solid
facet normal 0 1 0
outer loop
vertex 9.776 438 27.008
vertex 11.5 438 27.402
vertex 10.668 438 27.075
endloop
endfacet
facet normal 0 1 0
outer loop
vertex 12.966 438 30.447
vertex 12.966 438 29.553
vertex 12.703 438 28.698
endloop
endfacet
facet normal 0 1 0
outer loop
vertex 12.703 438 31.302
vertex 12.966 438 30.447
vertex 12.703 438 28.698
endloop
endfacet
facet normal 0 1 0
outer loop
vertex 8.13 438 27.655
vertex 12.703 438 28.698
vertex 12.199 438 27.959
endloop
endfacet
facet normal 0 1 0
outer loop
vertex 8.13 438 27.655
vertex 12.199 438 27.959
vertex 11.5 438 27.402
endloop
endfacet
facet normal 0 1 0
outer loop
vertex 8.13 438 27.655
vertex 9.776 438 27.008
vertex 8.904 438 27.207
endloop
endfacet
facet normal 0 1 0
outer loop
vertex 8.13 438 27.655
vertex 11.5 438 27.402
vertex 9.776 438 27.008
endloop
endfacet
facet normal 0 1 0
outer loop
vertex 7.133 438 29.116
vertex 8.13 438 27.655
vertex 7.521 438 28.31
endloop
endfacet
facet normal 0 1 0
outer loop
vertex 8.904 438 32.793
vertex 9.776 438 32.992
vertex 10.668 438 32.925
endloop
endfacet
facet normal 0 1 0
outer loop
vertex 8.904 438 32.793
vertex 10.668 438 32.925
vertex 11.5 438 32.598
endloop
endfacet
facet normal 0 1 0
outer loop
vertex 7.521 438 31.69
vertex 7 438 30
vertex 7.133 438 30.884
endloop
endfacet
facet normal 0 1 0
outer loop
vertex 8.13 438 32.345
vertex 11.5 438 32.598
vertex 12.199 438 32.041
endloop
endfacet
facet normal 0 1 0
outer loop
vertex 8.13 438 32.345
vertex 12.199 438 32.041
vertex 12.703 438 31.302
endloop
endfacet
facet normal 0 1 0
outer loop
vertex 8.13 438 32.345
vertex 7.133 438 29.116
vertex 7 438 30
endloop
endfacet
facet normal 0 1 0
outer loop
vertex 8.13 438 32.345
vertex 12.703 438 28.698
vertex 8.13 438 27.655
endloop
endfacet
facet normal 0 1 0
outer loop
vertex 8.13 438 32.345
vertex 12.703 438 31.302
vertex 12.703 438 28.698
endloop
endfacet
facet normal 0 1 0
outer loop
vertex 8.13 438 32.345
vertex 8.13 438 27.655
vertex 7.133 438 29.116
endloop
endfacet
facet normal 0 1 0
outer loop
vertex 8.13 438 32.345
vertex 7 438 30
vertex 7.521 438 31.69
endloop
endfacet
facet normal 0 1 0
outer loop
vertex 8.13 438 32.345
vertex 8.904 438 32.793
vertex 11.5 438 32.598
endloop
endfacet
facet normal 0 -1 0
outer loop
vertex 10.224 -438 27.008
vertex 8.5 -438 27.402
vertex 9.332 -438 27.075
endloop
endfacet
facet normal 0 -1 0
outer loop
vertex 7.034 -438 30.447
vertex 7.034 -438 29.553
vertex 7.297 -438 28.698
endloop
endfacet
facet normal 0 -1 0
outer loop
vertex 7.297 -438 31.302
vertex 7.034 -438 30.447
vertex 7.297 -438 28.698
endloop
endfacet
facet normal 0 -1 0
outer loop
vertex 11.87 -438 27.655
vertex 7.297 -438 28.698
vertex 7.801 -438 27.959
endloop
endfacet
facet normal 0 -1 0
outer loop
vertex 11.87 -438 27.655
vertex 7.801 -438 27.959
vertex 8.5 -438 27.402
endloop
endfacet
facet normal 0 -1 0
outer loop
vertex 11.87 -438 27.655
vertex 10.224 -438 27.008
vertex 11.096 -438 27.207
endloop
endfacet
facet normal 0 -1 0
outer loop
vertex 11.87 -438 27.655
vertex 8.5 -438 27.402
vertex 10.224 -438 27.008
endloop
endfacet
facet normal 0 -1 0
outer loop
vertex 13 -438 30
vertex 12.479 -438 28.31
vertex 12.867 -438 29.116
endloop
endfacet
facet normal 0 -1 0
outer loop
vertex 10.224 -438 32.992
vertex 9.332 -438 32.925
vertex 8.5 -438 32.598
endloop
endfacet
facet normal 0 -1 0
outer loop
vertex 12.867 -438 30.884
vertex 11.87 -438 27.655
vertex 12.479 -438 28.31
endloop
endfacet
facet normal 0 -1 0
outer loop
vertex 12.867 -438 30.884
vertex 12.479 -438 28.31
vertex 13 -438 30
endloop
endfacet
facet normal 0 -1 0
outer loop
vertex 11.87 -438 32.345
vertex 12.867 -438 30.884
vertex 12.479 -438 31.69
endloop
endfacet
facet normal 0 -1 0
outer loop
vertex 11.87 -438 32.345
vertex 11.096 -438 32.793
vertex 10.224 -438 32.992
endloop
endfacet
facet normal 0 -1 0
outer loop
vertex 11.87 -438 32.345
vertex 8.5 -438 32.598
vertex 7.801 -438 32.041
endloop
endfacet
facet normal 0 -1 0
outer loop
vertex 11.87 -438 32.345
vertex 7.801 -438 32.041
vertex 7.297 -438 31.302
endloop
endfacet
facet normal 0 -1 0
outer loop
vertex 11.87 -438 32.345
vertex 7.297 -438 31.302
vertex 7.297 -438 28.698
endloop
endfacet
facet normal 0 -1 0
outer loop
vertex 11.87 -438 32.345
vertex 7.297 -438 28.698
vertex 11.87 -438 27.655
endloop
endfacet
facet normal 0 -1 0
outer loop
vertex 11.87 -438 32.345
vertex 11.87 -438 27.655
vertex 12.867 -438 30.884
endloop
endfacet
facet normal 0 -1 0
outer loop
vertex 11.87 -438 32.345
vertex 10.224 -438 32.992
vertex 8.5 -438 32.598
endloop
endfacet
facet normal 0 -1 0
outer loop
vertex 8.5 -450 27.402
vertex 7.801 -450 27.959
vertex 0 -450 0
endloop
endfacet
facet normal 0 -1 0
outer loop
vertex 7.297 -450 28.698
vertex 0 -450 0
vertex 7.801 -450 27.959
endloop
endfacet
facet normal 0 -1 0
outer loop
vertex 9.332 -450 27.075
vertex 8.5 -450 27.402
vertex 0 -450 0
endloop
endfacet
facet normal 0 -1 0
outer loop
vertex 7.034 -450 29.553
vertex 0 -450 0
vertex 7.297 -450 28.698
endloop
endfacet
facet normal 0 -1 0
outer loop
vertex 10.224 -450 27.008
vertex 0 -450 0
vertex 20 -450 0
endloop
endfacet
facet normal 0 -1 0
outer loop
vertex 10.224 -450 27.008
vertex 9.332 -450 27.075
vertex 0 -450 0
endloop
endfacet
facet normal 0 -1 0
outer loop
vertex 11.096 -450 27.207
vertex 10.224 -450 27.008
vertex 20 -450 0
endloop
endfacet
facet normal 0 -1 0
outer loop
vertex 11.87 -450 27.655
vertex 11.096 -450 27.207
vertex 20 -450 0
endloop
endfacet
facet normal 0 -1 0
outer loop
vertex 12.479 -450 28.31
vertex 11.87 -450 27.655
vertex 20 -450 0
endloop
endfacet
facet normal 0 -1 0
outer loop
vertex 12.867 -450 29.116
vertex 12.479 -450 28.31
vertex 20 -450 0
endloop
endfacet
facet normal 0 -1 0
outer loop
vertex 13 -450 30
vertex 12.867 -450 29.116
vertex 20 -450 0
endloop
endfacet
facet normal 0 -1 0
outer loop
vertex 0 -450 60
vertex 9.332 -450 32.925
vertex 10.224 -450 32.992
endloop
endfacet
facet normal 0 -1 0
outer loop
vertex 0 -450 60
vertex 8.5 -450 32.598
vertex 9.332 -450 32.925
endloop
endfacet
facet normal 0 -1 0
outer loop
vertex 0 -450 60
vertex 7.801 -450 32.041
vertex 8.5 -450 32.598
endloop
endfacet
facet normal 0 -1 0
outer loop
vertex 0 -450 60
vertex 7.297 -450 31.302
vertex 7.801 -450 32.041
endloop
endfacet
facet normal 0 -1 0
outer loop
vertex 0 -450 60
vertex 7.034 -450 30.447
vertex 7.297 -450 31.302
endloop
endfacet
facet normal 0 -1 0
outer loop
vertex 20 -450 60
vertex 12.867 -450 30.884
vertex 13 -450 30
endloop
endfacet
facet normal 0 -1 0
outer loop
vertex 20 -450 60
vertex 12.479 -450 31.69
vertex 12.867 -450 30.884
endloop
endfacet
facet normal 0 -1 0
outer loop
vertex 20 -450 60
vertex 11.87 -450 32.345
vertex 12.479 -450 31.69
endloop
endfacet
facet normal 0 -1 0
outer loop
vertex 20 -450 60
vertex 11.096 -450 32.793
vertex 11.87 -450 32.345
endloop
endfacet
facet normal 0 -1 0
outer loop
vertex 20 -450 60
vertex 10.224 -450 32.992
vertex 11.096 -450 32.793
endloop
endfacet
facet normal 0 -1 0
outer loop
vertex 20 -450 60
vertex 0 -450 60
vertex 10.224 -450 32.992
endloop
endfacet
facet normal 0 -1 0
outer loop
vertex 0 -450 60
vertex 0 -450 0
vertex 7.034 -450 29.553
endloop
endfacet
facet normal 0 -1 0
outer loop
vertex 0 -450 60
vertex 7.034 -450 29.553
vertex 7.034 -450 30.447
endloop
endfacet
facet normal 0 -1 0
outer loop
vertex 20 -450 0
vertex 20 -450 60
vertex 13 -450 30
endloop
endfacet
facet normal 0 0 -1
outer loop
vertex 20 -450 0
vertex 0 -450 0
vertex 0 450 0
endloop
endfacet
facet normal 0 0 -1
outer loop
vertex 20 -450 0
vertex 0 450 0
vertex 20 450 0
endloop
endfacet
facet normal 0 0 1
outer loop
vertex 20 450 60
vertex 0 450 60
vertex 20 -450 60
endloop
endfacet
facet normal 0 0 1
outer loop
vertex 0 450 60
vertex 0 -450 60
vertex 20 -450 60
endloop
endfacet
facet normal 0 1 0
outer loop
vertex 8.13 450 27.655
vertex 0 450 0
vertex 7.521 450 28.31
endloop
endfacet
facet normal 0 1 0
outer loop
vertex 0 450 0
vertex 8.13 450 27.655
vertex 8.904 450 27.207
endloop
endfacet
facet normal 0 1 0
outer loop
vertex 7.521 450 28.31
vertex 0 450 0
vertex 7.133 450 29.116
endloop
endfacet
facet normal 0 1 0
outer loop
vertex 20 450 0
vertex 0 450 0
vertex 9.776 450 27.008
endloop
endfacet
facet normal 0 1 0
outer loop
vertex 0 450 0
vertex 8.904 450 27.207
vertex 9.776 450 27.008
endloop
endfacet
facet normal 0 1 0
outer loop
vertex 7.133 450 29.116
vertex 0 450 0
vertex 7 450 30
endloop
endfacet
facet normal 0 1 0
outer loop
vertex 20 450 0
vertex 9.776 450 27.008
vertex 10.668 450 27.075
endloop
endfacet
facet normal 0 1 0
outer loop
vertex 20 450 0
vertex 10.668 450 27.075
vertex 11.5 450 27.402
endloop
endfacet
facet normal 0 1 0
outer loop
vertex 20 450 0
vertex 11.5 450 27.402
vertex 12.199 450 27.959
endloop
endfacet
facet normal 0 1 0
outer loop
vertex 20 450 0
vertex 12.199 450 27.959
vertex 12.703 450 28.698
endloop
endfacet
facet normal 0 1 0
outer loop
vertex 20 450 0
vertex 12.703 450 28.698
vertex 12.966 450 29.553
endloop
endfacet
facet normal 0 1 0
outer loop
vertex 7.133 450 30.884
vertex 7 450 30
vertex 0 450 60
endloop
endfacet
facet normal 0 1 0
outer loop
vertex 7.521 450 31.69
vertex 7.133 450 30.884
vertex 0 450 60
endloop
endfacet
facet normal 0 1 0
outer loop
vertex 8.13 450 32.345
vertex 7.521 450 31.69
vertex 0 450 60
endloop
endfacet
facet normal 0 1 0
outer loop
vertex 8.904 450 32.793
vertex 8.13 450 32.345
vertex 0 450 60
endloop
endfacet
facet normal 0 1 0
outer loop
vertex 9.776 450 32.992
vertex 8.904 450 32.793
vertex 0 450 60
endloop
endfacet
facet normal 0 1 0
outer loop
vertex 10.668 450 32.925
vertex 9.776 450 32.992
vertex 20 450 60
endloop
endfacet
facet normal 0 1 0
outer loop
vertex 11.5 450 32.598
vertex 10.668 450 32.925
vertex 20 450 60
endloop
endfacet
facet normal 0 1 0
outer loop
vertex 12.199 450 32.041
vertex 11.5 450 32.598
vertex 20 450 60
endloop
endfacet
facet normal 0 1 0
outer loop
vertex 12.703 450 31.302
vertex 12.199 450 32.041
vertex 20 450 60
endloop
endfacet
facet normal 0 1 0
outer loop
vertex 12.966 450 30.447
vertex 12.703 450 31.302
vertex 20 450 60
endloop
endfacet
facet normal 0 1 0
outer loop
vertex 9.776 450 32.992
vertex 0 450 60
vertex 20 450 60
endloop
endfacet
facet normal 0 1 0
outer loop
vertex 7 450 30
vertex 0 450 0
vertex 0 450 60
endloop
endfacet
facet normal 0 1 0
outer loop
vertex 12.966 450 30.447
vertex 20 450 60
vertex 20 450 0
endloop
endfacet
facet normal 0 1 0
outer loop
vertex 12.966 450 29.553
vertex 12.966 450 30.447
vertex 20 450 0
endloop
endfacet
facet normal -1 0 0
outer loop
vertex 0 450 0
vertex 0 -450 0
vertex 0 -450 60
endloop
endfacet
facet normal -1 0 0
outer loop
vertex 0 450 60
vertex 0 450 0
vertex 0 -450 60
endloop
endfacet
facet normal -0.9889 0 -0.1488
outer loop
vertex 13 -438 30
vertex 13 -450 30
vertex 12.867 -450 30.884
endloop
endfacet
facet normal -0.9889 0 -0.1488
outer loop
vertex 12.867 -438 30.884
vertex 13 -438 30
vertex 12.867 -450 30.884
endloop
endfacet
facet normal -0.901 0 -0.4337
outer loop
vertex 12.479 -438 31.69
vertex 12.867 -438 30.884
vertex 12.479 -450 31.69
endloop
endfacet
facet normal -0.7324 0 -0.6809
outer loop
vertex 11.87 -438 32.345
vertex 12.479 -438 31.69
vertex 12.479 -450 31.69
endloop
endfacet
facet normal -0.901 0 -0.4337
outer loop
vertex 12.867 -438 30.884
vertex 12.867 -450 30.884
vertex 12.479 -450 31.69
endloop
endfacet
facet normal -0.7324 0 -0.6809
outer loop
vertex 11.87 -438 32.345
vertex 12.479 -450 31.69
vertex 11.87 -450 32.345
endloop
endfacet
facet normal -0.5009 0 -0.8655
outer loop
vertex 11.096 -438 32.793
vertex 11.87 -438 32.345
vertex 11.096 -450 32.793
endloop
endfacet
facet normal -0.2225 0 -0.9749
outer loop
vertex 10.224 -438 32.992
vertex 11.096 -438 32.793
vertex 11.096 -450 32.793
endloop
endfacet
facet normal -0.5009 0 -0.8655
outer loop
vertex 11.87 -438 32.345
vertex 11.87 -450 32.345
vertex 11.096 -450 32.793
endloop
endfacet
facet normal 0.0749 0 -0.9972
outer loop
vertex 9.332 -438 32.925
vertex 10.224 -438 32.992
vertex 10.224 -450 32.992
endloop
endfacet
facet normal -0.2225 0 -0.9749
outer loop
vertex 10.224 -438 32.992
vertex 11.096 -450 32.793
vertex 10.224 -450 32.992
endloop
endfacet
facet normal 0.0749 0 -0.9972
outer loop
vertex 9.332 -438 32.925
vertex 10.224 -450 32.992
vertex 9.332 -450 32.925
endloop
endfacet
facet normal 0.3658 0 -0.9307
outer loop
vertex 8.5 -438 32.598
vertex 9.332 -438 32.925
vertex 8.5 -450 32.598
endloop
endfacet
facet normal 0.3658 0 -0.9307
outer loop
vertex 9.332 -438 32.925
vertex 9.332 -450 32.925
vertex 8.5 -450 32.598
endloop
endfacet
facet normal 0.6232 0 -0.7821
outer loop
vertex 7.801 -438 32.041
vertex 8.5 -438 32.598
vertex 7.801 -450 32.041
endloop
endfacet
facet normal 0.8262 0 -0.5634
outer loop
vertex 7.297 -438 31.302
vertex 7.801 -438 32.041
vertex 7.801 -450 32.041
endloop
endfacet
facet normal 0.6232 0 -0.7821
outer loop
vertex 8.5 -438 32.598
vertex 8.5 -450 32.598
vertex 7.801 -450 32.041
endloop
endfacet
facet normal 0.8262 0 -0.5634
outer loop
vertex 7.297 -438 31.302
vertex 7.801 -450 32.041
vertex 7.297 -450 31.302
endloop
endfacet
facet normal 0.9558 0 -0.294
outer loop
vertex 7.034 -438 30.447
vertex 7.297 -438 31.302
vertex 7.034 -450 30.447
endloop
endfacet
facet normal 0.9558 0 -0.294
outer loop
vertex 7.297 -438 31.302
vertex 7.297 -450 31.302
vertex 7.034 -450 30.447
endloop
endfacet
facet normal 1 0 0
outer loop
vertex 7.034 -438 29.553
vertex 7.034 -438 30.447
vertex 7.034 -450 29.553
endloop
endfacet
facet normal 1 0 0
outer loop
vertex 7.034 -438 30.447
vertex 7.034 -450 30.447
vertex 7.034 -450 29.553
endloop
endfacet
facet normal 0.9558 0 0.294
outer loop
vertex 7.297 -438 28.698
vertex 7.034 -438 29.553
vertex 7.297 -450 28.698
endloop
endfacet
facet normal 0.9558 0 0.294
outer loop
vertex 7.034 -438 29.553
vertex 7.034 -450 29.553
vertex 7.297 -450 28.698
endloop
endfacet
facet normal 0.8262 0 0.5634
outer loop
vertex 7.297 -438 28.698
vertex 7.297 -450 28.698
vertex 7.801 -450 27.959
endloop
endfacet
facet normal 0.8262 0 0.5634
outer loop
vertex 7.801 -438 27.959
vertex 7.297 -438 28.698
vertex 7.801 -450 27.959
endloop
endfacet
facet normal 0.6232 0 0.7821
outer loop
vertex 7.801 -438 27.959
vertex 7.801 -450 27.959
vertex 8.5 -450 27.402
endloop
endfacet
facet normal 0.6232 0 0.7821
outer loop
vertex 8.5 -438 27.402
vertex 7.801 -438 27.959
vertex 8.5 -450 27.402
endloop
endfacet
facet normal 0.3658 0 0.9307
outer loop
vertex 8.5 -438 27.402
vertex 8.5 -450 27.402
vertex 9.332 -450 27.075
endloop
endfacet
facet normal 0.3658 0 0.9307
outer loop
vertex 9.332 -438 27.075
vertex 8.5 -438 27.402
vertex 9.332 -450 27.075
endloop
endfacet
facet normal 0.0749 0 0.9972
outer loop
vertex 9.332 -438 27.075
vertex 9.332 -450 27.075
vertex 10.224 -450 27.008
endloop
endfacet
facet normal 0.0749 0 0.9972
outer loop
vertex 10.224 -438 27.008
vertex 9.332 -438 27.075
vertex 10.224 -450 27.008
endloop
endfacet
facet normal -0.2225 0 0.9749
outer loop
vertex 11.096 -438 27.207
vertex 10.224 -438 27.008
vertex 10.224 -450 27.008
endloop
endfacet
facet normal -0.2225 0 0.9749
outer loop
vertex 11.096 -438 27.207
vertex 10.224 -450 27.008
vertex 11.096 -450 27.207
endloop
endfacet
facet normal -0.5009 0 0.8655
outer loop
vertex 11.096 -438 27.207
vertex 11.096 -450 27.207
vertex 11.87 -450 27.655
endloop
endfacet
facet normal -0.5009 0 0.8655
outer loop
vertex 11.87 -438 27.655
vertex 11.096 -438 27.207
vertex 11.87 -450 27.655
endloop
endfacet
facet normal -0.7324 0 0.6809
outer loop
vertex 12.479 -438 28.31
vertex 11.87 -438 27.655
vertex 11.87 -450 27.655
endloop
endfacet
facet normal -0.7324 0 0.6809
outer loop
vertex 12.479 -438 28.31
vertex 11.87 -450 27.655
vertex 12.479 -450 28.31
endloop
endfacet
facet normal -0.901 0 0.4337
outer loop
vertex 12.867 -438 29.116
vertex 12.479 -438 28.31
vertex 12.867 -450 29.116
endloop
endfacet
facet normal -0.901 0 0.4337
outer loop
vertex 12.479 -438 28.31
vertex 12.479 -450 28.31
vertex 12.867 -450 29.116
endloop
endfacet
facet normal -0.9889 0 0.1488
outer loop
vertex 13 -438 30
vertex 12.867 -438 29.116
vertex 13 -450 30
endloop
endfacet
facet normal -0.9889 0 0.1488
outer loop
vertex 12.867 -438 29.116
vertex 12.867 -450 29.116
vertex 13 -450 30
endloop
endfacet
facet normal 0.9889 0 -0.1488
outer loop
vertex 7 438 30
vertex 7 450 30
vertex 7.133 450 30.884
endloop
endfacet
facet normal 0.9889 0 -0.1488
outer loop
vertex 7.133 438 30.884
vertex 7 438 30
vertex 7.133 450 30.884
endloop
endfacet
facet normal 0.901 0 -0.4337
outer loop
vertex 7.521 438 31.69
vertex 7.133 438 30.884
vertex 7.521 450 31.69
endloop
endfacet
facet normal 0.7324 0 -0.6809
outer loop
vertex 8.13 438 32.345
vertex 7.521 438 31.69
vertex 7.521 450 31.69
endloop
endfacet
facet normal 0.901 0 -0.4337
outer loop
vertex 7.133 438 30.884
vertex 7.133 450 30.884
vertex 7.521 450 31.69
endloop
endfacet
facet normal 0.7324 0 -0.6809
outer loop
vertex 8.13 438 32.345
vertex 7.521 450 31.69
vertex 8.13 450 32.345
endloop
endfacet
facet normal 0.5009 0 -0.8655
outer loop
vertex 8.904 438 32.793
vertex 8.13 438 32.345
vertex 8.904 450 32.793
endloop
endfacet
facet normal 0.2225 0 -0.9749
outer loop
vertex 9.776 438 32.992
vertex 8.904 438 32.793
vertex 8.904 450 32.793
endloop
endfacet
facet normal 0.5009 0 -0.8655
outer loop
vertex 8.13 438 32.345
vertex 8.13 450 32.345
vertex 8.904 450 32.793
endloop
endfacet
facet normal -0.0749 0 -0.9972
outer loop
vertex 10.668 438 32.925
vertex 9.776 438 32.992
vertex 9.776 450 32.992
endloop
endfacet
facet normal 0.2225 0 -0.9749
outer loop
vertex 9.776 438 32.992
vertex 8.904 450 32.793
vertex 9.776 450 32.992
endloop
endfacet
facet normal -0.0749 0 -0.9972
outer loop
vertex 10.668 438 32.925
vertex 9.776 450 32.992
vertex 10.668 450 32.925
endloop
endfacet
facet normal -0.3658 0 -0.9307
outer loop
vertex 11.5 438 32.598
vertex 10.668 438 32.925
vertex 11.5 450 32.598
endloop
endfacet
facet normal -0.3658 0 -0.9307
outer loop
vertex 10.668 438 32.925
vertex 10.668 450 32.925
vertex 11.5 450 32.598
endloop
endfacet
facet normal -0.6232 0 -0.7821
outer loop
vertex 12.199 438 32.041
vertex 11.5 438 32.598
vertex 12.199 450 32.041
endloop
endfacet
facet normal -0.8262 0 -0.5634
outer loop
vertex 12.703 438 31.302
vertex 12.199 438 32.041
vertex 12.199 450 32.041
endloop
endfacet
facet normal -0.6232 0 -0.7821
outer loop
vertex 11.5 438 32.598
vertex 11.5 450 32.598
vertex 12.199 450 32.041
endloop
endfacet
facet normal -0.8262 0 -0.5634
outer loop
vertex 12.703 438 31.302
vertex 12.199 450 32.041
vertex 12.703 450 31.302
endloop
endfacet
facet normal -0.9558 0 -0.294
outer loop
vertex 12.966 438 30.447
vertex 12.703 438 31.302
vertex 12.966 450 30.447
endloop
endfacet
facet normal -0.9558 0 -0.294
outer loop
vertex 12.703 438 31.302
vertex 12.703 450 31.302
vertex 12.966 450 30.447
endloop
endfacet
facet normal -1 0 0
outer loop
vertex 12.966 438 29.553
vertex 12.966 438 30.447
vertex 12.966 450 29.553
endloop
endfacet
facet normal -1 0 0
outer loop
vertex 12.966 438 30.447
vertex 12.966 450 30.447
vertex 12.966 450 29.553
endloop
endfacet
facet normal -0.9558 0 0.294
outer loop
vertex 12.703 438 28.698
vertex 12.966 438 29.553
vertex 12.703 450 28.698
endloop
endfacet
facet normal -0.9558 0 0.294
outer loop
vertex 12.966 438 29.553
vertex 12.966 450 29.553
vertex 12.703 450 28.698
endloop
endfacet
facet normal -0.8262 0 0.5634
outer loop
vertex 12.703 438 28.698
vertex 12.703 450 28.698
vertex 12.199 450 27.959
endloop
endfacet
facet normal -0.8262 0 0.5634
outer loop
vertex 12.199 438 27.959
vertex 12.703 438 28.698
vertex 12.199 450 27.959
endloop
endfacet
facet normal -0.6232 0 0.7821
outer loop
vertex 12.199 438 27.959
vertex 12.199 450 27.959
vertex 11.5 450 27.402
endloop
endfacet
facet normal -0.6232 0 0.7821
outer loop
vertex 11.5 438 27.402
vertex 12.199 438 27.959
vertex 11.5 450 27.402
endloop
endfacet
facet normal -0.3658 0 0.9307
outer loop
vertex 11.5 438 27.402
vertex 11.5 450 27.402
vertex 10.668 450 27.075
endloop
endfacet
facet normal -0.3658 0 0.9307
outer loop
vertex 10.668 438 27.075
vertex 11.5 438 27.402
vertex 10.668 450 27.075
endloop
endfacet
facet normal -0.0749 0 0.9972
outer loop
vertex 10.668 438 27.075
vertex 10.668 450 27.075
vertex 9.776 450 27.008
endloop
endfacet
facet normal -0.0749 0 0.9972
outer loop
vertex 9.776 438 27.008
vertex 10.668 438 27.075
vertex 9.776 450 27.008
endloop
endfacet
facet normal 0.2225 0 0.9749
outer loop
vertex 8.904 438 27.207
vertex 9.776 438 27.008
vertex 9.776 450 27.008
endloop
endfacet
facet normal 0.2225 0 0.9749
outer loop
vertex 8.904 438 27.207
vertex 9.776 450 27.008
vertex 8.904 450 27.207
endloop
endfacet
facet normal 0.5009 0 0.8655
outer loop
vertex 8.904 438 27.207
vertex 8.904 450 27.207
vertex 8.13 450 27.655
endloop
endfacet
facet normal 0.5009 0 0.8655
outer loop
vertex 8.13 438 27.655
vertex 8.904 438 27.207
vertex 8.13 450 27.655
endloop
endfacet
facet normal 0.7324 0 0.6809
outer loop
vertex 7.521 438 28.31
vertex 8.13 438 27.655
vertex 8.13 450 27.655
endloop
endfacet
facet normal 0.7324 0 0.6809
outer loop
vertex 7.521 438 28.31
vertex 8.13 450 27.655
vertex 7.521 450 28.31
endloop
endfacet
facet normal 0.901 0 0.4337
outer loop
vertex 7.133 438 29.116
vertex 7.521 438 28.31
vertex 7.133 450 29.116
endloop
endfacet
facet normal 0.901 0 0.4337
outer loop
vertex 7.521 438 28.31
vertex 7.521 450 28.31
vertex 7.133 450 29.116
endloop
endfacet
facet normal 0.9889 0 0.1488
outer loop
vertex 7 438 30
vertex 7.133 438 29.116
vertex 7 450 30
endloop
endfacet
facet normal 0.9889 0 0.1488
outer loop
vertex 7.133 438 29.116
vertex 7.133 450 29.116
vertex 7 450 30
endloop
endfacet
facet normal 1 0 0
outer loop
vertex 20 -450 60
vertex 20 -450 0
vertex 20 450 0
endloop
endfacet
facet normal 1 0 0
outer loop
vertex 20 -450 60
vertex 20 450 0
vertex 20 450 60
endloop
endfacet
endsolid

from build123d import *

# Parameters (mm, degrees)
F0_W     = 20
F0_H     = 60
F1_DEPTH = 450
F3_R     = 3
F4_DEPTH = 12
F2_R     = 3
F5_DEPTH = 12


with BuildPart() as f1:
    # F0 (on Front) → F1 (new body, symmetric)
    with BuildSketch(Plane.XZ):
        with Locations((10, 30)):
            Rectangle(F0_W, F0_H)
    extrude(amount=F1_DEPTH, both=True)

    # F3 (on face) → F4 (cut)
    with BuildSketch(Plane(origin=(0, 450, 0), x_dir=(-1, 0, 0), z_dir=(0, 1, 0))):
        with Locations((-10, 30)):
            Circle(F3_R)
    extrude(amount=-F4_DEPTH, mode=Mode.SUBTRACT)

    # F2 (on face) → F5 (cut)
    with BuildSketch(Plane.XZ.offset(450)):
        with Locations((10, 30)):
            Circle(F2_R)
    extrude(amount=-F5_DEPTH, mode=Mode.SUBTRACT)


solid = f1.part
